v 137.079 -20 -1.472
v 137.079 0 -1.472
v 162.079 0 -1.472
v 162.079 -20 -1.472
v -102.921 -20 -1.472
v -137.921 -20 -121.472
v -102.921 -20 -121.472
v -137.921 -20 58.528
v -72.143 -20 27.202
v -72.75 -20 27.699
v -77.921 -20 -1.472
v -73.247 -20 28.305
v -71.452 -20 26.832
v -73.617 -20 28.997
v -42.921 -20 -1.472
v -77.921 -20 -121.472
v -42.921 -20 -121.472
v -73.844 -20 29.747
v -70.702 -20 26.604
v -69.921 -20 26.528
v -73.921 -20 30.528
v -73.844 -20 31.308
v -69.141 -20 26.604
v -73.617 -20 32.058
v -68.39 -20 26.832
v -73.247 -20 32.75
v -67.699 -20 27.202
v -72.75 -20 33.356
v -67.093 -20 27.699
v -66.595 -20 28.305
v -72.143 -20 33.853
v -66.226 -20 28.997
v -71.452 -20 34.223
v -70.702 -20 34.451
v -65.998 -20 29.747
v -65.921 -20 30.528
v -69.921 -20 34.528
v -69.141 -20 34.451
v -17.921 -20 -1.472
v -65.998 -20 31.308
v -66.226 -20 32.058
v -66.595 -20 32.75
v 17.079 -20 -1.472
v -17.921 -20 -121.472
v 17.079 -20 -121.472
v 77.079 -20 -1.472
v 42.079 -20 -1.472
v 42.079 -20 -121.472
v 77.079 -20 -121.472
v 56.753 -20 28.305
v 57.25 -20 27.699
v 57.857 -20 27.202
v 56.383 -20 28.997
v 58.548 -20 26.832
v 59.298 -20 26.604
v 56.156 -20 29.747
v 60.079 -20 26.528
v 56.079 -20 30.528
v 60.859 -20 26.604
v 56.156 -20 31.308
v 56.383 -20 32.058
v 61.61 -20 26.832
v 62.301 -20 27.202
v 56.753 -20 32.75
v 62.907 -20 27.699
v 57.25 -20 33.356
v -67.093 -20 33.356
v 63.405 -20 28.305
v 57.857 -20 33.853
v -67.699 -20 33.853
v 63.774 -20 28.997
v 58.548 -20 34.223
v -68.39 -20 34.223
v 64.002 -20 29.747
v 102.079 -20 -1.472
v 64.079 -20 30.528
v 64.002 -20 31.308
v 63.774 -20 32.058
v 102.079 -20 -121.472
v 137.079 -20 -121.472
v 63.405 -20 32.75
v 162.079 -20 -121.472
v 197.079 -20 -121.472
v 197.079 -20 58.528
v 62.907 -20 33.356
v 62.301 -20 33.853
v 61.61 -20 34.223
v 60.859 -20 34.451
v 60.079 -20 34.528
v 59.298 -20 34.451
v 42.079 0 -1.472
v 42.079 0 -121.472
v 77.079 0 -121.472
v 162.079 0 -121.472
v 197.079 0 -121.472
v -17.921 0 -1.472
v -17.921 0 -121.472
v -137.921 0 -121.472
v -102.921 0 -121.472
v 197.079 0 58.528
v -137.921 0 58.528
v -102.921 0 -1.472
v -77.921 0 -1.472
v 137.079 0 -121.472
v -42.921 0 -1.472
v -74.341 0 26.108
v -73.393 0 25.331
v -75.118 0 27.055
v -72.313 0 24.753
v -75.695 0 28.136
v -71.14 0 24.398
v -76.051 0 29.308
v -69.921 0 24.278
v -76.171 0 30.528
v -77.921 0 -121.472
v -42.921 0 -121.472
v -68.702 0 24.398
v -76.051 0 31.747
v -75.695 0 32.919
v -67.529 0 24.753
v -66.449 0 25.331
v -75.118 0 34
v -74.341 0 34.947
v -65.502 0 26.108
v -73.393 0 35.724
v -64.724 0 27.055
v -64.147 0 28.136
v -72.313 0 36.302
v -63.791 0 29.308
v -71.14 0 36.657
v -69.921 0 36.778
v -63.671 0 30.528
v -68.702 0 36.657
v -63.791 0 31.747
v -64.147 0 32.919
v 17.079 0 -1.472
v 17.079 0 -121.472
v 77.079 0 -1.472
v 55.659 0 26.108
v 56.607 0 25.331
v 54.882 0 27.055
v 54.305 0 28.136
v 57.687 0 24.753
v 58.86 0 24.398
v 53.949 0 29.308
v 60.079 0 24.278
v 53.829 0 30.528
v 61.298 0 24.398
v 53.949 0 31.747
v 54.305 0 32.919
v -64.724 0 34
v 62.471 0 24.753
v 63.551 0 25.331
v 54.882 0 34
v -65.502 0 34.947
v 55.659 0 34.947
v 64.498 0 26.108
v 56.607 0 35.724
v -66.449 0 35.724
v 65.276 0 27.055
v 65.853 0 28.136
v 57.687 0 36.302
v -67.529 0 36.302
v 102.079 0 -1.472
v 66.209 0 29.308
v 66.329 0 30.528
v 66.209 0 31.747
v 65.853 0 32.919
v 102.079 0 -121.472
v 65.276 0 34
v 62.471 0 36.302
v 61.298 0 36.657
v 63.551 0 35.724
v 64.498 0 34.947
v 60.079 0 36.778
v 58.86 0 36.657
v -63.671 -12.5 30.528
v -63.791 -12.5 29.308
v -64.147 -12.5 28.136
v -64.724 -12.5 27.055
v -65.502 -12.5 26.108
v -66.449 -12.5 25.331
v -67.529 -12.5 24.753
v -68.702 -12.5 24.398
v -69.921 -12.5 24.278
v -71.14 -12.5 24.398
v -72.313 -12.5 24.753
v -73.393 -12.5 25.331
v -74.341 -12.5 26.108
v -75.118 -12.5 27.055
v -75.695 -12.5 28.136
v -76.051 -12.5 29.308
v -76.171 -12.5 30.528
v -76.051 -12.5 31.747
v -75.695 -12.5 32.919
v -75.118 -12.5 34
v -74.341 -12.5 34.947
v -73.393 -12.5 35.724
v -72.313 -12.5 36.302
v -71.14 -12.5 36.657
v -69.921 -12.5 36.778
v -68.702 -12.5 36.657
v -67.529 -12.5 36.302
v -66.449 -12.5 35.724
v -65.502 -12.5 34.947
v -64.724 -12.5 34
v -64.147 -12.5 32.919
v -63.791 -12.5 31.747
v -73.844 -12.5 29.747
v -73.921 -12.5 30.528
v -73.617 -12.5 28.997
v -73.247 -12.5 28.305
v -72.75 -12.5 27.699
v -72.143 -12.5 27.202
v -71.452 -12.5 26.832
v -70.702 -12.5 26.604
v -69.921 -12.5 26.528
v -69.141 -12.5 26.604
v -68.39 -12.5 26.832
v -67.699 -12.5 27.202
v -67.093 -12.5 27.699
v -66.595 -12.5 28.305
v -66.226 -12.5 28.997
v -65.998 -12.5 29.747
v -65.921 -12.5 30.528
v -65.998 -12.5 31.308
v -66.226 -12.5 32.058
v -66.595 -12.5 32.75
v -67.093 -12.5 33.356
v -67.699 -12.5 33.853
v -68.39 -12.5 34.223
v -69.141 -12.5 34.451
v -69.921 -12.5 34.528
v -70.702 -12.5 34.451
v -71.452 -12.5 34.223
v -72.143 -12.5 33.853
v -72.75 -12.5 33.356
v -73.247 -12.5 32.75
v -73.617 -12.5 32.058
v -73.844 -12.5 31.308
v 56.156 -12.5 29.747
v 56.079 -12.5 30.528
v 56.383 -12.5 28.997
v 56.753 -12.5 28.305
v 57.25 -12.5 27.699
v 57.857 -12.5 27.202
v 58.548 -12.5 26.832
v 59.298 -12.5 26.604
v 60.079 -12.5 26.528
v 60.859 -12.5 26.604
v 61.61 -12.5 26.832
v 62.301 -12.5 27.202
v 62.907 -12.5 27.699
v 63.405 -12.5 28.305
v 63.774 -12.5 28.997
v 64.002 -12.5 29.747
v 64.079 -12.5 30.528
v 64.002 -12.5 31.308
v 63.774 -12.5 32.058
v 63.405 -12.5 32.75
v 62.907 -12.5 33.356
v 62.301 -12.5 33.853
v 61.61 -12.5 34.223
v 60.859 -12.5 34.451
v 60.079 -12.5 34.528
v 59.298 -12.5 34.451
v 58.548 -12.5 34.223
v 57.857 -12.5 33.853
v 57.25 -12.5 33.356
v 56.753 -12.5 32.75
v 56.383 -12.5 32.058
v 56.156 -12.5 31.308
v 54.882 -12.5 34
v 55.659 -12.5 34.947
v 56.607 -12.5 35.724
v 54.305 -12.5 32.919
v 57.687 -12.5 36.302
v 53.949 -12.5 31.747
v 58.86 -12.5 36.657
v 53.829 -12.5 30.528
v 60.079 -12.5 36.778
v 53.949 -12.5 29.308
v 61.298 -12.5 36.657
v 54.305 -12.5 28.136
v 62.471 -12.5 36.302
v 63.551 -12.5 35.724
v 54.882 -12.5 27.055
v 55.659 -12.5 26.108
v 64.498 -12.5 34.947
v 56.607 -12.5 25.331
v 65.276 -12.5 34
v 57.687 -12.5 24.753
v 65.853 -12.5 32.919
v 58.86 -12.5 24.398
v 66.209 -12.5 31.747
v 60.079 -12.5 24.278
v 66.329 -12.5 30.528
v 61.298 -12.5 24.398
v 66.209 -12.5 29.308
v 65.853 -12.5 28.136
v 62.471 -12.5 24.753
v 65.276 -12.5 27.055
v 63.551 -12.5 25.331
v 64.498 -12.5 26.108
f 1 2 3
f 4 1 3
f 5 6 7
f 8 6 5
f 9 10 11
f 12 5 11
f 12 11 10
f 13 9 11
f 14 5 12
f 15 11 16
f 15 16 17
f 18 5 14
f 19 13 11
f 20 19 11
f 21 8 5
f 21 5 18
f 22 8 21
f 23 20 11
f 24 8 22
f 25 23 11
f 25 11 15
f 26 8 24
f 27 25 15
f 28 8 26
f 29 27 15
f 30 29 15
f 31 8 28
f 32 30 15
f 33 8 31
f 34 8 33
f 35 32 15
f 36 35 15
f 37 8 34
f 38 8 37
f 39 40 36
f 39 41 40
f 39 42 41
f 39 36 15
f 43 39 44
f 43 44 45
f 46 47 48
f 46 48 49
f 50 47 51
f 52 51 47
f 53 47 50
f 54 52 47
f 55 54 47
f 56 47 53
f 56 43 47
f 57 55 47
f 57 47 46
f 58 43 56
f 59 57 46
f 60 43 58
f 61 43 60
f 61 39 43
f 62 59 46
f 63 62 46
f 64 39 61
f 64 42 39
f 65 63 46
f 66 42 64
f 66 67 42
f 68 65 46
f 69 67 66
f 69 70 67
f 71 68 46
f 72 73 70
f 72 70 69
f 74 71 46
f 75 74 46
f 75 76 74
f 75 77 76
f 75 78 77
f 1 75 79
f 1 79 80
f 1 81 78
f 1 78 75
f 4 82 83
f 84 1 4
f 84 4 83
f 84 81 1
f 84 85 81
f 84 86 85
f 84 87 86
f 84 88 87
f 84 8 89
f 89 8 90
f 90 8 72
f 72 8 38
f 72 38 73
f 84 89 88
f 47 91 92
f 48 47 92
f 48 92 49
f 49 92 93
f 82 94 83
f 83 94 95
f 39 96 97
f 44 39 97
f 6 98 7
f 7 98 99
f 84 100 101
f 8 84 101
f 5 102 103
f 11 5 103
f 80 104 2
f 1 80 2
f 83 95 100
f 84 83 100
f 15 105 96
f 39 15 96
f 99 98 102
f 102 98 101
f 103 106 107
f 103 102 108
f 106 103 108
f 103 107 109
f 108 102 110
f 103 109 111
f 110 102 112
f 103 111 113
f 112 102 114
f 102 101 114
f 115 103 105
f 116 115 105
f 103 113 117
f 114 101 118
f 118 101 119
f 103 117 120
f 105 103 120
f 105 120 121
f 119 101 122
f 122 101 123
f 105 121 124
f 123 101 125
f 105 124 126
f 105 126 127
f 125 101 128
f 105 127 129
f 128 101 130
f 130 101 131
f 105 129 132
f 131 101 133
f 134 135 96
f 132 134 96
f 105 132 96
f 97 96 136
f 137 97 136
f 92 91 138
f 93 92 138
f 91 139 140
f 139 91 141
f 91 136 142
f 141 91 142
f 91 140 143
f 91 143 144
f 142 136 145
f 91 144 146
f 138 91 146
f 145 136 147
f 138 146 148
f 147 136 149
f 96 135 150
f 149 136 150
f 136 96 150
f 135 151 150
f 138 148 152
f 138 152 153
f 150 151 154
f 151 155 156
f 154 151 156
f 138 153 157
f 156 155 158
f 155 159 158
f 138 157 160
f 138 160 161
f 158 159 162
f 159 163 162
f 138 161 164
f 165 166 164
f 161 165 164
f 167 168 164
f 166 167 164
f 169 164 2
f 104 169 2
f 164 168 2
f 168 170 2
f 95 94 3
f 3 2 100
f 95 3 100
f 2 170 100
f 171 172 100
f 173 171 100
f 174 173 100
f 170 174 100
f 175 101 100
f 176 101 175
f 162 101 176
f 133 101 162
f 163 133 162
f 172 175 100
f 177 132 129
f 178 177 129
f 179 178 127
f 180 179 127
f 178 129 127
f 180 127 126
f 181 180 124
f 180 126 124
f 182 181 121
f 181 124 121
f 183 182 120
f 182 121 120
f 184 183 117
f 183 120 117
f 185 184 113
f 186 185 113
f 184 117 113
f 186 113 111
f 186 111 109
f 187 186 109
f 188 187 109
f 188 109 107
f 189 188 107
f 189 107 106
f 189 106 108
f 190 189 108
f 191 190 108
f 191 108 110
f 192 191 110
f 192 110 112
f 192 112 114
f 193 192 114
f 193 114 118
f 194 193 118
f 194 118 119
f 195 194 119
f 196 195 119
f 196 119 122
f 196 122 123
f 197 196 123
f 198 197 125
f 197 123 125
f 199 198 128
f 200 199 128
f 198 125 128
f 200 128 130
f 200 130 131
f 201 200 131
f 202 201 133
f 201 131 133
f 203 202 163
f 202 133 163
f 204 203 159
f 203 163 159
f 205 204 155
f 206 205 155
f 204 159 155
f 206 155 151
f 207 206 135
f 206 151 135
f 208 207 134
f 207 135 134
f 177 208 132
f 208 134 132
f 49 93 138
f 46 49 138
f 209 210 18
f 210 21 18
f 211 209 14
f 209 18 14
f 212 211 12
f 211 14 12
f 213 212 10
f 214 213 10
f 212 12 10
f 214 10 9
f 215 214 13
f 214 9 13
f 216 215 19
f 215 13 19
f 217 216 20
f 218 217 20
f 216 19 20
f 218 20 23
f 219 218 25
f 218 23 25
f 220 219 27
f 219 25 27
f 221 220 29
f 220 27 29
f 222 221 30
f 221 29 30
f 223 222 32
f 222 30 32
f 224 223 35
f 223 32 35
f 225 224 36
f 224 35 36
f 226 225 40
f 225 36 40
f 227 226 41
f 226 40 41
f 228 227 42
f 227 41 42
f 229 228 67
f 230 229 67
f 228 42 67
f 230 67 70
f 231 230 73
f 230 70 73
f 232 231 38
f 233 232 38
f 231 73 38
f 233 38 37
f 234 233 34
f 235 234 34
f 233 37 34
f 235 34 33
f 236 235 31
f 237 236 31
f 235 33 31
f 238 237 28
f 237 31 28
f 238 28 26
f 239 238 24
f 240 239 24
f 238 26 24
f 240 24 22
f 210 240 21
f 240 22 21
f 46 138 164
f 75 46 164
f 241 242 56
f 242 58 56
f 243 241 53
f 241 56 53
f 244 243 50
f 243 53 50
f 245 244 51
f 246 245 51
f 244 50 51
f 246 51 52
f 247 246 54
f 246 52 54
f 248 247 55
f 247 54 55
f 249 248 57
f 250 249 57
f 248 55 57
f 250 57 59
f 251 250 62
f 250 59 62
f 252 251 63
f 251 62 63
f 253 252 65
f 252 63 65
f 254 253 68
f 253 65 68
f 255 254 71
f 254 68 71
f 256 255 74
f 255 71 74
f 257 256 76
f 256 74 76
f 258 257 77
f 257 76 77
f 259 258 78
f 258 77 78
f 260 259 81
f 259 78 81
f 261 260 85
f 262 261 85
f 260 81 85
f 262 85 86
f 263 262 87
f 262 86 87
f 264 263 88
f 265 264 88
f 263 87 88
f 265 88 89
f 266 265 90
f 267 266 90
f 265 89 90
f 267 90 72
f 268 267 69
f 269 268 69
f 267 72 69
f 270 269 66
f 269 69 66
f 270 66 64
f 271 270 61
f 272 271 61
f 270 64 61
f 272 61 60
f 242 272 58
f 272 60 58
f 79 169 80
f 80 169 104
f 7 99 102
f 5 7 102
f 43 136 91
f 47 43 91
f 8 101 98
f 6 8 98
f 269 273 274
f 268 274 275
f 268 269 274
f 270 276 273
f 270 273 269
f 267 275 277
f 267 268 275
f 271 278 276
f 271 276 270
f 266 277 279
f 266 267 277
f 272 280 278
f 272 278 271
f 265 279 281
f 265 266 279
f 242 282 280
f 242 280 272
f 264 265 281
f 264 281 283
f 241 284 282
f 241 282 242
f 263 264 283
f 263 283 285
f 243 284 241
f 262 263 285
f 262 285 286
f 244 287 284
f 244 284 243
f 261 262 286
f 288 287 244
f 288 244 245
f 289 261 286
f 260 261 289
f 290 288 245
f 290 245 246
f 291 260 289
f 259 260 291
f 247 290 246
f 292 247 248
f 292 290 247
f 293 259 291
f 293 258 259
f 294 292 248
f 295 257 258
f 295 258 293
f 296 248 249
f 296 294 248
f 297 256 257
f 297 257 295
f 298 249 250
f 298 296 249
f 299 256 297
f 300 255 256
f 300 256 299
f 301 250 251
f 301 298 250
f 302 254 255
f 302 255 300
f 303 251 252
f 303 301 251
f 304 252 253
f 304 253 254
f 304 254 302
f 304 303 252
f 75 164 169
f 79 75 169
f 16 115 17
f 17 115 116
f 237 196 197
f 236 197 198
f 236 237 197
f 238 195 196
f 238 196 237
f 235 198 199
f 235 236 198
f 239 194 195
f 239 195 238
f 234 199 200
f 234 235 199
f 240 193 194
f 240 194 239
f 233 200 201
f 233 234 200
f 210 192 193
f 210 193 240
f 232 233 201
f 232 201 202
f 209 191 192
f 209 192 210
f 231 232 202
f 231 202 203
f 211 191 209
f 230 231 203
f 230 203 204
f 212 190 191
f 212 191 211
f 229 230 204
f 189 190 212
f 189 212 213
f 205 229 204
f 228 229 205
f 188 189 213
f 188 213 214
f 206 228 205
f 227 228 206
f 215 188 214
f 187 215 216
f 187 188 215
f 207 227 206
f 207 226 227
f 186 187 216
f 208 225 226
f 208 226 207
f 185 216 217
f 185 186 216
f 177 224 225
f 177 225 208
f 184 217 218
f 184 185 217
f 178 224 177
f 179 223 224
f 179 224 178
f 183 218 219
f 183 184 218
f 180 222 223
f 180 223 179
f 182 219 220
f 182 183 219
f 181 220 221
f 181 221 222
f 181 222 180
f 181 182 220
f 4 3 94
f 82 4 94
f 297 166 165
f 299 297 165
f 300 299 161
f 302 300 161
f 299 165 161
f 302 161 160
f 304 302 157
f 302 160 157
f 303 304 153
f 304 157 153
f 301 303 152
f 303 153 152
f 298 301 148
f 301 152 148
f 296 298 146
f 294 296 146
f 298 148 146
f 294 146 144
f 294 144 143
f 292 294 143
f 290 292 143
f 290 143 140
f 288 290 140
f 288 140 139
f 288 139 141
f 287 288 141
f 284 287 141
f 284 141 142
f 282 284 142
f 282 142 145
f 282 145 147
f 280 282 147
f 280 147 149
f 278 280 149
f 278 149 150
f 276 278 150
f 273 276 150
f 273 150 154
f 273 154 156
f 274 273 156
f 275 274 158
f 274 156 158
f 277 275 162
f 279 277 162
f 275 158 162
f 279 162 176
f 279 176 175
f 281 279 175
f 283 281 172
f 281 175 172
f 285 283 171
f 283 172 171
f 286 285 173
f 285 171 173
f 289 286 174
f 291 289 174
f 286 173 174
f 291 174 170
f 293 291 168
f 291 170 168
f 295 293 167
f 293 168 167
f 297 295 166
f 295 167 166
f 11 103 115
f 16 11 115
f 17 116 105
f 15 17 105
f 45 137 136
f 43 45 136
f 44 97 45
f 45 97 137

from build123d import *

# Parameters (mm, degrees)
F1_DEPTH       = 20
F2_D           = 8
F2_CBORE_D     = 12.5
F2_CBORE_DEPTH = 12.5
F3_D           = 8
F3_CBORE_D     = 12.5
F3_CBORE_DEPTH = 12.5


with BuildPart() as f1:
    # F0 (on Front) → F1 (new body)
    with BuildSketch(Plane.XZ):
        Polygon((197.0788455009, 58.5275515914), (-137.9211544991, 58.5275515914), (-137.9211544991, -121.4724484086), (-102.9211544991, -121.4724484086), (-102.9211544991, -1.4724484086), (-77.9211544991, -1.4724484086), (-77.9211544991, -121.4724484086), (-42.9211544991, -121.4724484086), (-42.9211544991, -1.4724484086), (-17.9211544991, -1.4724484086), (-17.9211544991, -121.4724484086), (17.0788455009, -121.4724484086), (17.0788455009, -1.4724484086), (42.0788455009, -1.4724484086), (42.0788455009, -121.4724484086), (77.0788455009, -121.4724484086), (77.0788455009, -1.4724484086), (102.0788455009, -1.4724484086), (102.0788455009, -121.4724484086), (137.0788455009, -121.4724484086), (137.0788455009, -1.4724484086), (162.0788455009, -1.4724484086), (162.0788455009, -121.4724484086), (197.0788455009, -121.4724484086), align=None)
    extrude(amount=F1_DEPTH)

    # F2 (through all)
    with Locations(Plane(origin=(0, 0, 0), x_dir=(1, 0, 0), z_dir=(0, 1, 0))):
        with Locations((-69.9211544991, -30.5275515914)):
            CounterBoreHole(F2_D / 2, F2_CBORE_D / 2, F2_CBORE_DEPTH)

    # F3 (through all)
    with Locations(Plane(origin=(0, 0, 0), x_dir=(1, 0, 0), z_dir=(0, 1, 0))):
        with Locations((60.0788455009, -30.5275515914)):
            CounterBoreHole(F3_D / 2, F3_CBORE_D / 2, F3_CBORE_DEPTH)


solid = f1.part
